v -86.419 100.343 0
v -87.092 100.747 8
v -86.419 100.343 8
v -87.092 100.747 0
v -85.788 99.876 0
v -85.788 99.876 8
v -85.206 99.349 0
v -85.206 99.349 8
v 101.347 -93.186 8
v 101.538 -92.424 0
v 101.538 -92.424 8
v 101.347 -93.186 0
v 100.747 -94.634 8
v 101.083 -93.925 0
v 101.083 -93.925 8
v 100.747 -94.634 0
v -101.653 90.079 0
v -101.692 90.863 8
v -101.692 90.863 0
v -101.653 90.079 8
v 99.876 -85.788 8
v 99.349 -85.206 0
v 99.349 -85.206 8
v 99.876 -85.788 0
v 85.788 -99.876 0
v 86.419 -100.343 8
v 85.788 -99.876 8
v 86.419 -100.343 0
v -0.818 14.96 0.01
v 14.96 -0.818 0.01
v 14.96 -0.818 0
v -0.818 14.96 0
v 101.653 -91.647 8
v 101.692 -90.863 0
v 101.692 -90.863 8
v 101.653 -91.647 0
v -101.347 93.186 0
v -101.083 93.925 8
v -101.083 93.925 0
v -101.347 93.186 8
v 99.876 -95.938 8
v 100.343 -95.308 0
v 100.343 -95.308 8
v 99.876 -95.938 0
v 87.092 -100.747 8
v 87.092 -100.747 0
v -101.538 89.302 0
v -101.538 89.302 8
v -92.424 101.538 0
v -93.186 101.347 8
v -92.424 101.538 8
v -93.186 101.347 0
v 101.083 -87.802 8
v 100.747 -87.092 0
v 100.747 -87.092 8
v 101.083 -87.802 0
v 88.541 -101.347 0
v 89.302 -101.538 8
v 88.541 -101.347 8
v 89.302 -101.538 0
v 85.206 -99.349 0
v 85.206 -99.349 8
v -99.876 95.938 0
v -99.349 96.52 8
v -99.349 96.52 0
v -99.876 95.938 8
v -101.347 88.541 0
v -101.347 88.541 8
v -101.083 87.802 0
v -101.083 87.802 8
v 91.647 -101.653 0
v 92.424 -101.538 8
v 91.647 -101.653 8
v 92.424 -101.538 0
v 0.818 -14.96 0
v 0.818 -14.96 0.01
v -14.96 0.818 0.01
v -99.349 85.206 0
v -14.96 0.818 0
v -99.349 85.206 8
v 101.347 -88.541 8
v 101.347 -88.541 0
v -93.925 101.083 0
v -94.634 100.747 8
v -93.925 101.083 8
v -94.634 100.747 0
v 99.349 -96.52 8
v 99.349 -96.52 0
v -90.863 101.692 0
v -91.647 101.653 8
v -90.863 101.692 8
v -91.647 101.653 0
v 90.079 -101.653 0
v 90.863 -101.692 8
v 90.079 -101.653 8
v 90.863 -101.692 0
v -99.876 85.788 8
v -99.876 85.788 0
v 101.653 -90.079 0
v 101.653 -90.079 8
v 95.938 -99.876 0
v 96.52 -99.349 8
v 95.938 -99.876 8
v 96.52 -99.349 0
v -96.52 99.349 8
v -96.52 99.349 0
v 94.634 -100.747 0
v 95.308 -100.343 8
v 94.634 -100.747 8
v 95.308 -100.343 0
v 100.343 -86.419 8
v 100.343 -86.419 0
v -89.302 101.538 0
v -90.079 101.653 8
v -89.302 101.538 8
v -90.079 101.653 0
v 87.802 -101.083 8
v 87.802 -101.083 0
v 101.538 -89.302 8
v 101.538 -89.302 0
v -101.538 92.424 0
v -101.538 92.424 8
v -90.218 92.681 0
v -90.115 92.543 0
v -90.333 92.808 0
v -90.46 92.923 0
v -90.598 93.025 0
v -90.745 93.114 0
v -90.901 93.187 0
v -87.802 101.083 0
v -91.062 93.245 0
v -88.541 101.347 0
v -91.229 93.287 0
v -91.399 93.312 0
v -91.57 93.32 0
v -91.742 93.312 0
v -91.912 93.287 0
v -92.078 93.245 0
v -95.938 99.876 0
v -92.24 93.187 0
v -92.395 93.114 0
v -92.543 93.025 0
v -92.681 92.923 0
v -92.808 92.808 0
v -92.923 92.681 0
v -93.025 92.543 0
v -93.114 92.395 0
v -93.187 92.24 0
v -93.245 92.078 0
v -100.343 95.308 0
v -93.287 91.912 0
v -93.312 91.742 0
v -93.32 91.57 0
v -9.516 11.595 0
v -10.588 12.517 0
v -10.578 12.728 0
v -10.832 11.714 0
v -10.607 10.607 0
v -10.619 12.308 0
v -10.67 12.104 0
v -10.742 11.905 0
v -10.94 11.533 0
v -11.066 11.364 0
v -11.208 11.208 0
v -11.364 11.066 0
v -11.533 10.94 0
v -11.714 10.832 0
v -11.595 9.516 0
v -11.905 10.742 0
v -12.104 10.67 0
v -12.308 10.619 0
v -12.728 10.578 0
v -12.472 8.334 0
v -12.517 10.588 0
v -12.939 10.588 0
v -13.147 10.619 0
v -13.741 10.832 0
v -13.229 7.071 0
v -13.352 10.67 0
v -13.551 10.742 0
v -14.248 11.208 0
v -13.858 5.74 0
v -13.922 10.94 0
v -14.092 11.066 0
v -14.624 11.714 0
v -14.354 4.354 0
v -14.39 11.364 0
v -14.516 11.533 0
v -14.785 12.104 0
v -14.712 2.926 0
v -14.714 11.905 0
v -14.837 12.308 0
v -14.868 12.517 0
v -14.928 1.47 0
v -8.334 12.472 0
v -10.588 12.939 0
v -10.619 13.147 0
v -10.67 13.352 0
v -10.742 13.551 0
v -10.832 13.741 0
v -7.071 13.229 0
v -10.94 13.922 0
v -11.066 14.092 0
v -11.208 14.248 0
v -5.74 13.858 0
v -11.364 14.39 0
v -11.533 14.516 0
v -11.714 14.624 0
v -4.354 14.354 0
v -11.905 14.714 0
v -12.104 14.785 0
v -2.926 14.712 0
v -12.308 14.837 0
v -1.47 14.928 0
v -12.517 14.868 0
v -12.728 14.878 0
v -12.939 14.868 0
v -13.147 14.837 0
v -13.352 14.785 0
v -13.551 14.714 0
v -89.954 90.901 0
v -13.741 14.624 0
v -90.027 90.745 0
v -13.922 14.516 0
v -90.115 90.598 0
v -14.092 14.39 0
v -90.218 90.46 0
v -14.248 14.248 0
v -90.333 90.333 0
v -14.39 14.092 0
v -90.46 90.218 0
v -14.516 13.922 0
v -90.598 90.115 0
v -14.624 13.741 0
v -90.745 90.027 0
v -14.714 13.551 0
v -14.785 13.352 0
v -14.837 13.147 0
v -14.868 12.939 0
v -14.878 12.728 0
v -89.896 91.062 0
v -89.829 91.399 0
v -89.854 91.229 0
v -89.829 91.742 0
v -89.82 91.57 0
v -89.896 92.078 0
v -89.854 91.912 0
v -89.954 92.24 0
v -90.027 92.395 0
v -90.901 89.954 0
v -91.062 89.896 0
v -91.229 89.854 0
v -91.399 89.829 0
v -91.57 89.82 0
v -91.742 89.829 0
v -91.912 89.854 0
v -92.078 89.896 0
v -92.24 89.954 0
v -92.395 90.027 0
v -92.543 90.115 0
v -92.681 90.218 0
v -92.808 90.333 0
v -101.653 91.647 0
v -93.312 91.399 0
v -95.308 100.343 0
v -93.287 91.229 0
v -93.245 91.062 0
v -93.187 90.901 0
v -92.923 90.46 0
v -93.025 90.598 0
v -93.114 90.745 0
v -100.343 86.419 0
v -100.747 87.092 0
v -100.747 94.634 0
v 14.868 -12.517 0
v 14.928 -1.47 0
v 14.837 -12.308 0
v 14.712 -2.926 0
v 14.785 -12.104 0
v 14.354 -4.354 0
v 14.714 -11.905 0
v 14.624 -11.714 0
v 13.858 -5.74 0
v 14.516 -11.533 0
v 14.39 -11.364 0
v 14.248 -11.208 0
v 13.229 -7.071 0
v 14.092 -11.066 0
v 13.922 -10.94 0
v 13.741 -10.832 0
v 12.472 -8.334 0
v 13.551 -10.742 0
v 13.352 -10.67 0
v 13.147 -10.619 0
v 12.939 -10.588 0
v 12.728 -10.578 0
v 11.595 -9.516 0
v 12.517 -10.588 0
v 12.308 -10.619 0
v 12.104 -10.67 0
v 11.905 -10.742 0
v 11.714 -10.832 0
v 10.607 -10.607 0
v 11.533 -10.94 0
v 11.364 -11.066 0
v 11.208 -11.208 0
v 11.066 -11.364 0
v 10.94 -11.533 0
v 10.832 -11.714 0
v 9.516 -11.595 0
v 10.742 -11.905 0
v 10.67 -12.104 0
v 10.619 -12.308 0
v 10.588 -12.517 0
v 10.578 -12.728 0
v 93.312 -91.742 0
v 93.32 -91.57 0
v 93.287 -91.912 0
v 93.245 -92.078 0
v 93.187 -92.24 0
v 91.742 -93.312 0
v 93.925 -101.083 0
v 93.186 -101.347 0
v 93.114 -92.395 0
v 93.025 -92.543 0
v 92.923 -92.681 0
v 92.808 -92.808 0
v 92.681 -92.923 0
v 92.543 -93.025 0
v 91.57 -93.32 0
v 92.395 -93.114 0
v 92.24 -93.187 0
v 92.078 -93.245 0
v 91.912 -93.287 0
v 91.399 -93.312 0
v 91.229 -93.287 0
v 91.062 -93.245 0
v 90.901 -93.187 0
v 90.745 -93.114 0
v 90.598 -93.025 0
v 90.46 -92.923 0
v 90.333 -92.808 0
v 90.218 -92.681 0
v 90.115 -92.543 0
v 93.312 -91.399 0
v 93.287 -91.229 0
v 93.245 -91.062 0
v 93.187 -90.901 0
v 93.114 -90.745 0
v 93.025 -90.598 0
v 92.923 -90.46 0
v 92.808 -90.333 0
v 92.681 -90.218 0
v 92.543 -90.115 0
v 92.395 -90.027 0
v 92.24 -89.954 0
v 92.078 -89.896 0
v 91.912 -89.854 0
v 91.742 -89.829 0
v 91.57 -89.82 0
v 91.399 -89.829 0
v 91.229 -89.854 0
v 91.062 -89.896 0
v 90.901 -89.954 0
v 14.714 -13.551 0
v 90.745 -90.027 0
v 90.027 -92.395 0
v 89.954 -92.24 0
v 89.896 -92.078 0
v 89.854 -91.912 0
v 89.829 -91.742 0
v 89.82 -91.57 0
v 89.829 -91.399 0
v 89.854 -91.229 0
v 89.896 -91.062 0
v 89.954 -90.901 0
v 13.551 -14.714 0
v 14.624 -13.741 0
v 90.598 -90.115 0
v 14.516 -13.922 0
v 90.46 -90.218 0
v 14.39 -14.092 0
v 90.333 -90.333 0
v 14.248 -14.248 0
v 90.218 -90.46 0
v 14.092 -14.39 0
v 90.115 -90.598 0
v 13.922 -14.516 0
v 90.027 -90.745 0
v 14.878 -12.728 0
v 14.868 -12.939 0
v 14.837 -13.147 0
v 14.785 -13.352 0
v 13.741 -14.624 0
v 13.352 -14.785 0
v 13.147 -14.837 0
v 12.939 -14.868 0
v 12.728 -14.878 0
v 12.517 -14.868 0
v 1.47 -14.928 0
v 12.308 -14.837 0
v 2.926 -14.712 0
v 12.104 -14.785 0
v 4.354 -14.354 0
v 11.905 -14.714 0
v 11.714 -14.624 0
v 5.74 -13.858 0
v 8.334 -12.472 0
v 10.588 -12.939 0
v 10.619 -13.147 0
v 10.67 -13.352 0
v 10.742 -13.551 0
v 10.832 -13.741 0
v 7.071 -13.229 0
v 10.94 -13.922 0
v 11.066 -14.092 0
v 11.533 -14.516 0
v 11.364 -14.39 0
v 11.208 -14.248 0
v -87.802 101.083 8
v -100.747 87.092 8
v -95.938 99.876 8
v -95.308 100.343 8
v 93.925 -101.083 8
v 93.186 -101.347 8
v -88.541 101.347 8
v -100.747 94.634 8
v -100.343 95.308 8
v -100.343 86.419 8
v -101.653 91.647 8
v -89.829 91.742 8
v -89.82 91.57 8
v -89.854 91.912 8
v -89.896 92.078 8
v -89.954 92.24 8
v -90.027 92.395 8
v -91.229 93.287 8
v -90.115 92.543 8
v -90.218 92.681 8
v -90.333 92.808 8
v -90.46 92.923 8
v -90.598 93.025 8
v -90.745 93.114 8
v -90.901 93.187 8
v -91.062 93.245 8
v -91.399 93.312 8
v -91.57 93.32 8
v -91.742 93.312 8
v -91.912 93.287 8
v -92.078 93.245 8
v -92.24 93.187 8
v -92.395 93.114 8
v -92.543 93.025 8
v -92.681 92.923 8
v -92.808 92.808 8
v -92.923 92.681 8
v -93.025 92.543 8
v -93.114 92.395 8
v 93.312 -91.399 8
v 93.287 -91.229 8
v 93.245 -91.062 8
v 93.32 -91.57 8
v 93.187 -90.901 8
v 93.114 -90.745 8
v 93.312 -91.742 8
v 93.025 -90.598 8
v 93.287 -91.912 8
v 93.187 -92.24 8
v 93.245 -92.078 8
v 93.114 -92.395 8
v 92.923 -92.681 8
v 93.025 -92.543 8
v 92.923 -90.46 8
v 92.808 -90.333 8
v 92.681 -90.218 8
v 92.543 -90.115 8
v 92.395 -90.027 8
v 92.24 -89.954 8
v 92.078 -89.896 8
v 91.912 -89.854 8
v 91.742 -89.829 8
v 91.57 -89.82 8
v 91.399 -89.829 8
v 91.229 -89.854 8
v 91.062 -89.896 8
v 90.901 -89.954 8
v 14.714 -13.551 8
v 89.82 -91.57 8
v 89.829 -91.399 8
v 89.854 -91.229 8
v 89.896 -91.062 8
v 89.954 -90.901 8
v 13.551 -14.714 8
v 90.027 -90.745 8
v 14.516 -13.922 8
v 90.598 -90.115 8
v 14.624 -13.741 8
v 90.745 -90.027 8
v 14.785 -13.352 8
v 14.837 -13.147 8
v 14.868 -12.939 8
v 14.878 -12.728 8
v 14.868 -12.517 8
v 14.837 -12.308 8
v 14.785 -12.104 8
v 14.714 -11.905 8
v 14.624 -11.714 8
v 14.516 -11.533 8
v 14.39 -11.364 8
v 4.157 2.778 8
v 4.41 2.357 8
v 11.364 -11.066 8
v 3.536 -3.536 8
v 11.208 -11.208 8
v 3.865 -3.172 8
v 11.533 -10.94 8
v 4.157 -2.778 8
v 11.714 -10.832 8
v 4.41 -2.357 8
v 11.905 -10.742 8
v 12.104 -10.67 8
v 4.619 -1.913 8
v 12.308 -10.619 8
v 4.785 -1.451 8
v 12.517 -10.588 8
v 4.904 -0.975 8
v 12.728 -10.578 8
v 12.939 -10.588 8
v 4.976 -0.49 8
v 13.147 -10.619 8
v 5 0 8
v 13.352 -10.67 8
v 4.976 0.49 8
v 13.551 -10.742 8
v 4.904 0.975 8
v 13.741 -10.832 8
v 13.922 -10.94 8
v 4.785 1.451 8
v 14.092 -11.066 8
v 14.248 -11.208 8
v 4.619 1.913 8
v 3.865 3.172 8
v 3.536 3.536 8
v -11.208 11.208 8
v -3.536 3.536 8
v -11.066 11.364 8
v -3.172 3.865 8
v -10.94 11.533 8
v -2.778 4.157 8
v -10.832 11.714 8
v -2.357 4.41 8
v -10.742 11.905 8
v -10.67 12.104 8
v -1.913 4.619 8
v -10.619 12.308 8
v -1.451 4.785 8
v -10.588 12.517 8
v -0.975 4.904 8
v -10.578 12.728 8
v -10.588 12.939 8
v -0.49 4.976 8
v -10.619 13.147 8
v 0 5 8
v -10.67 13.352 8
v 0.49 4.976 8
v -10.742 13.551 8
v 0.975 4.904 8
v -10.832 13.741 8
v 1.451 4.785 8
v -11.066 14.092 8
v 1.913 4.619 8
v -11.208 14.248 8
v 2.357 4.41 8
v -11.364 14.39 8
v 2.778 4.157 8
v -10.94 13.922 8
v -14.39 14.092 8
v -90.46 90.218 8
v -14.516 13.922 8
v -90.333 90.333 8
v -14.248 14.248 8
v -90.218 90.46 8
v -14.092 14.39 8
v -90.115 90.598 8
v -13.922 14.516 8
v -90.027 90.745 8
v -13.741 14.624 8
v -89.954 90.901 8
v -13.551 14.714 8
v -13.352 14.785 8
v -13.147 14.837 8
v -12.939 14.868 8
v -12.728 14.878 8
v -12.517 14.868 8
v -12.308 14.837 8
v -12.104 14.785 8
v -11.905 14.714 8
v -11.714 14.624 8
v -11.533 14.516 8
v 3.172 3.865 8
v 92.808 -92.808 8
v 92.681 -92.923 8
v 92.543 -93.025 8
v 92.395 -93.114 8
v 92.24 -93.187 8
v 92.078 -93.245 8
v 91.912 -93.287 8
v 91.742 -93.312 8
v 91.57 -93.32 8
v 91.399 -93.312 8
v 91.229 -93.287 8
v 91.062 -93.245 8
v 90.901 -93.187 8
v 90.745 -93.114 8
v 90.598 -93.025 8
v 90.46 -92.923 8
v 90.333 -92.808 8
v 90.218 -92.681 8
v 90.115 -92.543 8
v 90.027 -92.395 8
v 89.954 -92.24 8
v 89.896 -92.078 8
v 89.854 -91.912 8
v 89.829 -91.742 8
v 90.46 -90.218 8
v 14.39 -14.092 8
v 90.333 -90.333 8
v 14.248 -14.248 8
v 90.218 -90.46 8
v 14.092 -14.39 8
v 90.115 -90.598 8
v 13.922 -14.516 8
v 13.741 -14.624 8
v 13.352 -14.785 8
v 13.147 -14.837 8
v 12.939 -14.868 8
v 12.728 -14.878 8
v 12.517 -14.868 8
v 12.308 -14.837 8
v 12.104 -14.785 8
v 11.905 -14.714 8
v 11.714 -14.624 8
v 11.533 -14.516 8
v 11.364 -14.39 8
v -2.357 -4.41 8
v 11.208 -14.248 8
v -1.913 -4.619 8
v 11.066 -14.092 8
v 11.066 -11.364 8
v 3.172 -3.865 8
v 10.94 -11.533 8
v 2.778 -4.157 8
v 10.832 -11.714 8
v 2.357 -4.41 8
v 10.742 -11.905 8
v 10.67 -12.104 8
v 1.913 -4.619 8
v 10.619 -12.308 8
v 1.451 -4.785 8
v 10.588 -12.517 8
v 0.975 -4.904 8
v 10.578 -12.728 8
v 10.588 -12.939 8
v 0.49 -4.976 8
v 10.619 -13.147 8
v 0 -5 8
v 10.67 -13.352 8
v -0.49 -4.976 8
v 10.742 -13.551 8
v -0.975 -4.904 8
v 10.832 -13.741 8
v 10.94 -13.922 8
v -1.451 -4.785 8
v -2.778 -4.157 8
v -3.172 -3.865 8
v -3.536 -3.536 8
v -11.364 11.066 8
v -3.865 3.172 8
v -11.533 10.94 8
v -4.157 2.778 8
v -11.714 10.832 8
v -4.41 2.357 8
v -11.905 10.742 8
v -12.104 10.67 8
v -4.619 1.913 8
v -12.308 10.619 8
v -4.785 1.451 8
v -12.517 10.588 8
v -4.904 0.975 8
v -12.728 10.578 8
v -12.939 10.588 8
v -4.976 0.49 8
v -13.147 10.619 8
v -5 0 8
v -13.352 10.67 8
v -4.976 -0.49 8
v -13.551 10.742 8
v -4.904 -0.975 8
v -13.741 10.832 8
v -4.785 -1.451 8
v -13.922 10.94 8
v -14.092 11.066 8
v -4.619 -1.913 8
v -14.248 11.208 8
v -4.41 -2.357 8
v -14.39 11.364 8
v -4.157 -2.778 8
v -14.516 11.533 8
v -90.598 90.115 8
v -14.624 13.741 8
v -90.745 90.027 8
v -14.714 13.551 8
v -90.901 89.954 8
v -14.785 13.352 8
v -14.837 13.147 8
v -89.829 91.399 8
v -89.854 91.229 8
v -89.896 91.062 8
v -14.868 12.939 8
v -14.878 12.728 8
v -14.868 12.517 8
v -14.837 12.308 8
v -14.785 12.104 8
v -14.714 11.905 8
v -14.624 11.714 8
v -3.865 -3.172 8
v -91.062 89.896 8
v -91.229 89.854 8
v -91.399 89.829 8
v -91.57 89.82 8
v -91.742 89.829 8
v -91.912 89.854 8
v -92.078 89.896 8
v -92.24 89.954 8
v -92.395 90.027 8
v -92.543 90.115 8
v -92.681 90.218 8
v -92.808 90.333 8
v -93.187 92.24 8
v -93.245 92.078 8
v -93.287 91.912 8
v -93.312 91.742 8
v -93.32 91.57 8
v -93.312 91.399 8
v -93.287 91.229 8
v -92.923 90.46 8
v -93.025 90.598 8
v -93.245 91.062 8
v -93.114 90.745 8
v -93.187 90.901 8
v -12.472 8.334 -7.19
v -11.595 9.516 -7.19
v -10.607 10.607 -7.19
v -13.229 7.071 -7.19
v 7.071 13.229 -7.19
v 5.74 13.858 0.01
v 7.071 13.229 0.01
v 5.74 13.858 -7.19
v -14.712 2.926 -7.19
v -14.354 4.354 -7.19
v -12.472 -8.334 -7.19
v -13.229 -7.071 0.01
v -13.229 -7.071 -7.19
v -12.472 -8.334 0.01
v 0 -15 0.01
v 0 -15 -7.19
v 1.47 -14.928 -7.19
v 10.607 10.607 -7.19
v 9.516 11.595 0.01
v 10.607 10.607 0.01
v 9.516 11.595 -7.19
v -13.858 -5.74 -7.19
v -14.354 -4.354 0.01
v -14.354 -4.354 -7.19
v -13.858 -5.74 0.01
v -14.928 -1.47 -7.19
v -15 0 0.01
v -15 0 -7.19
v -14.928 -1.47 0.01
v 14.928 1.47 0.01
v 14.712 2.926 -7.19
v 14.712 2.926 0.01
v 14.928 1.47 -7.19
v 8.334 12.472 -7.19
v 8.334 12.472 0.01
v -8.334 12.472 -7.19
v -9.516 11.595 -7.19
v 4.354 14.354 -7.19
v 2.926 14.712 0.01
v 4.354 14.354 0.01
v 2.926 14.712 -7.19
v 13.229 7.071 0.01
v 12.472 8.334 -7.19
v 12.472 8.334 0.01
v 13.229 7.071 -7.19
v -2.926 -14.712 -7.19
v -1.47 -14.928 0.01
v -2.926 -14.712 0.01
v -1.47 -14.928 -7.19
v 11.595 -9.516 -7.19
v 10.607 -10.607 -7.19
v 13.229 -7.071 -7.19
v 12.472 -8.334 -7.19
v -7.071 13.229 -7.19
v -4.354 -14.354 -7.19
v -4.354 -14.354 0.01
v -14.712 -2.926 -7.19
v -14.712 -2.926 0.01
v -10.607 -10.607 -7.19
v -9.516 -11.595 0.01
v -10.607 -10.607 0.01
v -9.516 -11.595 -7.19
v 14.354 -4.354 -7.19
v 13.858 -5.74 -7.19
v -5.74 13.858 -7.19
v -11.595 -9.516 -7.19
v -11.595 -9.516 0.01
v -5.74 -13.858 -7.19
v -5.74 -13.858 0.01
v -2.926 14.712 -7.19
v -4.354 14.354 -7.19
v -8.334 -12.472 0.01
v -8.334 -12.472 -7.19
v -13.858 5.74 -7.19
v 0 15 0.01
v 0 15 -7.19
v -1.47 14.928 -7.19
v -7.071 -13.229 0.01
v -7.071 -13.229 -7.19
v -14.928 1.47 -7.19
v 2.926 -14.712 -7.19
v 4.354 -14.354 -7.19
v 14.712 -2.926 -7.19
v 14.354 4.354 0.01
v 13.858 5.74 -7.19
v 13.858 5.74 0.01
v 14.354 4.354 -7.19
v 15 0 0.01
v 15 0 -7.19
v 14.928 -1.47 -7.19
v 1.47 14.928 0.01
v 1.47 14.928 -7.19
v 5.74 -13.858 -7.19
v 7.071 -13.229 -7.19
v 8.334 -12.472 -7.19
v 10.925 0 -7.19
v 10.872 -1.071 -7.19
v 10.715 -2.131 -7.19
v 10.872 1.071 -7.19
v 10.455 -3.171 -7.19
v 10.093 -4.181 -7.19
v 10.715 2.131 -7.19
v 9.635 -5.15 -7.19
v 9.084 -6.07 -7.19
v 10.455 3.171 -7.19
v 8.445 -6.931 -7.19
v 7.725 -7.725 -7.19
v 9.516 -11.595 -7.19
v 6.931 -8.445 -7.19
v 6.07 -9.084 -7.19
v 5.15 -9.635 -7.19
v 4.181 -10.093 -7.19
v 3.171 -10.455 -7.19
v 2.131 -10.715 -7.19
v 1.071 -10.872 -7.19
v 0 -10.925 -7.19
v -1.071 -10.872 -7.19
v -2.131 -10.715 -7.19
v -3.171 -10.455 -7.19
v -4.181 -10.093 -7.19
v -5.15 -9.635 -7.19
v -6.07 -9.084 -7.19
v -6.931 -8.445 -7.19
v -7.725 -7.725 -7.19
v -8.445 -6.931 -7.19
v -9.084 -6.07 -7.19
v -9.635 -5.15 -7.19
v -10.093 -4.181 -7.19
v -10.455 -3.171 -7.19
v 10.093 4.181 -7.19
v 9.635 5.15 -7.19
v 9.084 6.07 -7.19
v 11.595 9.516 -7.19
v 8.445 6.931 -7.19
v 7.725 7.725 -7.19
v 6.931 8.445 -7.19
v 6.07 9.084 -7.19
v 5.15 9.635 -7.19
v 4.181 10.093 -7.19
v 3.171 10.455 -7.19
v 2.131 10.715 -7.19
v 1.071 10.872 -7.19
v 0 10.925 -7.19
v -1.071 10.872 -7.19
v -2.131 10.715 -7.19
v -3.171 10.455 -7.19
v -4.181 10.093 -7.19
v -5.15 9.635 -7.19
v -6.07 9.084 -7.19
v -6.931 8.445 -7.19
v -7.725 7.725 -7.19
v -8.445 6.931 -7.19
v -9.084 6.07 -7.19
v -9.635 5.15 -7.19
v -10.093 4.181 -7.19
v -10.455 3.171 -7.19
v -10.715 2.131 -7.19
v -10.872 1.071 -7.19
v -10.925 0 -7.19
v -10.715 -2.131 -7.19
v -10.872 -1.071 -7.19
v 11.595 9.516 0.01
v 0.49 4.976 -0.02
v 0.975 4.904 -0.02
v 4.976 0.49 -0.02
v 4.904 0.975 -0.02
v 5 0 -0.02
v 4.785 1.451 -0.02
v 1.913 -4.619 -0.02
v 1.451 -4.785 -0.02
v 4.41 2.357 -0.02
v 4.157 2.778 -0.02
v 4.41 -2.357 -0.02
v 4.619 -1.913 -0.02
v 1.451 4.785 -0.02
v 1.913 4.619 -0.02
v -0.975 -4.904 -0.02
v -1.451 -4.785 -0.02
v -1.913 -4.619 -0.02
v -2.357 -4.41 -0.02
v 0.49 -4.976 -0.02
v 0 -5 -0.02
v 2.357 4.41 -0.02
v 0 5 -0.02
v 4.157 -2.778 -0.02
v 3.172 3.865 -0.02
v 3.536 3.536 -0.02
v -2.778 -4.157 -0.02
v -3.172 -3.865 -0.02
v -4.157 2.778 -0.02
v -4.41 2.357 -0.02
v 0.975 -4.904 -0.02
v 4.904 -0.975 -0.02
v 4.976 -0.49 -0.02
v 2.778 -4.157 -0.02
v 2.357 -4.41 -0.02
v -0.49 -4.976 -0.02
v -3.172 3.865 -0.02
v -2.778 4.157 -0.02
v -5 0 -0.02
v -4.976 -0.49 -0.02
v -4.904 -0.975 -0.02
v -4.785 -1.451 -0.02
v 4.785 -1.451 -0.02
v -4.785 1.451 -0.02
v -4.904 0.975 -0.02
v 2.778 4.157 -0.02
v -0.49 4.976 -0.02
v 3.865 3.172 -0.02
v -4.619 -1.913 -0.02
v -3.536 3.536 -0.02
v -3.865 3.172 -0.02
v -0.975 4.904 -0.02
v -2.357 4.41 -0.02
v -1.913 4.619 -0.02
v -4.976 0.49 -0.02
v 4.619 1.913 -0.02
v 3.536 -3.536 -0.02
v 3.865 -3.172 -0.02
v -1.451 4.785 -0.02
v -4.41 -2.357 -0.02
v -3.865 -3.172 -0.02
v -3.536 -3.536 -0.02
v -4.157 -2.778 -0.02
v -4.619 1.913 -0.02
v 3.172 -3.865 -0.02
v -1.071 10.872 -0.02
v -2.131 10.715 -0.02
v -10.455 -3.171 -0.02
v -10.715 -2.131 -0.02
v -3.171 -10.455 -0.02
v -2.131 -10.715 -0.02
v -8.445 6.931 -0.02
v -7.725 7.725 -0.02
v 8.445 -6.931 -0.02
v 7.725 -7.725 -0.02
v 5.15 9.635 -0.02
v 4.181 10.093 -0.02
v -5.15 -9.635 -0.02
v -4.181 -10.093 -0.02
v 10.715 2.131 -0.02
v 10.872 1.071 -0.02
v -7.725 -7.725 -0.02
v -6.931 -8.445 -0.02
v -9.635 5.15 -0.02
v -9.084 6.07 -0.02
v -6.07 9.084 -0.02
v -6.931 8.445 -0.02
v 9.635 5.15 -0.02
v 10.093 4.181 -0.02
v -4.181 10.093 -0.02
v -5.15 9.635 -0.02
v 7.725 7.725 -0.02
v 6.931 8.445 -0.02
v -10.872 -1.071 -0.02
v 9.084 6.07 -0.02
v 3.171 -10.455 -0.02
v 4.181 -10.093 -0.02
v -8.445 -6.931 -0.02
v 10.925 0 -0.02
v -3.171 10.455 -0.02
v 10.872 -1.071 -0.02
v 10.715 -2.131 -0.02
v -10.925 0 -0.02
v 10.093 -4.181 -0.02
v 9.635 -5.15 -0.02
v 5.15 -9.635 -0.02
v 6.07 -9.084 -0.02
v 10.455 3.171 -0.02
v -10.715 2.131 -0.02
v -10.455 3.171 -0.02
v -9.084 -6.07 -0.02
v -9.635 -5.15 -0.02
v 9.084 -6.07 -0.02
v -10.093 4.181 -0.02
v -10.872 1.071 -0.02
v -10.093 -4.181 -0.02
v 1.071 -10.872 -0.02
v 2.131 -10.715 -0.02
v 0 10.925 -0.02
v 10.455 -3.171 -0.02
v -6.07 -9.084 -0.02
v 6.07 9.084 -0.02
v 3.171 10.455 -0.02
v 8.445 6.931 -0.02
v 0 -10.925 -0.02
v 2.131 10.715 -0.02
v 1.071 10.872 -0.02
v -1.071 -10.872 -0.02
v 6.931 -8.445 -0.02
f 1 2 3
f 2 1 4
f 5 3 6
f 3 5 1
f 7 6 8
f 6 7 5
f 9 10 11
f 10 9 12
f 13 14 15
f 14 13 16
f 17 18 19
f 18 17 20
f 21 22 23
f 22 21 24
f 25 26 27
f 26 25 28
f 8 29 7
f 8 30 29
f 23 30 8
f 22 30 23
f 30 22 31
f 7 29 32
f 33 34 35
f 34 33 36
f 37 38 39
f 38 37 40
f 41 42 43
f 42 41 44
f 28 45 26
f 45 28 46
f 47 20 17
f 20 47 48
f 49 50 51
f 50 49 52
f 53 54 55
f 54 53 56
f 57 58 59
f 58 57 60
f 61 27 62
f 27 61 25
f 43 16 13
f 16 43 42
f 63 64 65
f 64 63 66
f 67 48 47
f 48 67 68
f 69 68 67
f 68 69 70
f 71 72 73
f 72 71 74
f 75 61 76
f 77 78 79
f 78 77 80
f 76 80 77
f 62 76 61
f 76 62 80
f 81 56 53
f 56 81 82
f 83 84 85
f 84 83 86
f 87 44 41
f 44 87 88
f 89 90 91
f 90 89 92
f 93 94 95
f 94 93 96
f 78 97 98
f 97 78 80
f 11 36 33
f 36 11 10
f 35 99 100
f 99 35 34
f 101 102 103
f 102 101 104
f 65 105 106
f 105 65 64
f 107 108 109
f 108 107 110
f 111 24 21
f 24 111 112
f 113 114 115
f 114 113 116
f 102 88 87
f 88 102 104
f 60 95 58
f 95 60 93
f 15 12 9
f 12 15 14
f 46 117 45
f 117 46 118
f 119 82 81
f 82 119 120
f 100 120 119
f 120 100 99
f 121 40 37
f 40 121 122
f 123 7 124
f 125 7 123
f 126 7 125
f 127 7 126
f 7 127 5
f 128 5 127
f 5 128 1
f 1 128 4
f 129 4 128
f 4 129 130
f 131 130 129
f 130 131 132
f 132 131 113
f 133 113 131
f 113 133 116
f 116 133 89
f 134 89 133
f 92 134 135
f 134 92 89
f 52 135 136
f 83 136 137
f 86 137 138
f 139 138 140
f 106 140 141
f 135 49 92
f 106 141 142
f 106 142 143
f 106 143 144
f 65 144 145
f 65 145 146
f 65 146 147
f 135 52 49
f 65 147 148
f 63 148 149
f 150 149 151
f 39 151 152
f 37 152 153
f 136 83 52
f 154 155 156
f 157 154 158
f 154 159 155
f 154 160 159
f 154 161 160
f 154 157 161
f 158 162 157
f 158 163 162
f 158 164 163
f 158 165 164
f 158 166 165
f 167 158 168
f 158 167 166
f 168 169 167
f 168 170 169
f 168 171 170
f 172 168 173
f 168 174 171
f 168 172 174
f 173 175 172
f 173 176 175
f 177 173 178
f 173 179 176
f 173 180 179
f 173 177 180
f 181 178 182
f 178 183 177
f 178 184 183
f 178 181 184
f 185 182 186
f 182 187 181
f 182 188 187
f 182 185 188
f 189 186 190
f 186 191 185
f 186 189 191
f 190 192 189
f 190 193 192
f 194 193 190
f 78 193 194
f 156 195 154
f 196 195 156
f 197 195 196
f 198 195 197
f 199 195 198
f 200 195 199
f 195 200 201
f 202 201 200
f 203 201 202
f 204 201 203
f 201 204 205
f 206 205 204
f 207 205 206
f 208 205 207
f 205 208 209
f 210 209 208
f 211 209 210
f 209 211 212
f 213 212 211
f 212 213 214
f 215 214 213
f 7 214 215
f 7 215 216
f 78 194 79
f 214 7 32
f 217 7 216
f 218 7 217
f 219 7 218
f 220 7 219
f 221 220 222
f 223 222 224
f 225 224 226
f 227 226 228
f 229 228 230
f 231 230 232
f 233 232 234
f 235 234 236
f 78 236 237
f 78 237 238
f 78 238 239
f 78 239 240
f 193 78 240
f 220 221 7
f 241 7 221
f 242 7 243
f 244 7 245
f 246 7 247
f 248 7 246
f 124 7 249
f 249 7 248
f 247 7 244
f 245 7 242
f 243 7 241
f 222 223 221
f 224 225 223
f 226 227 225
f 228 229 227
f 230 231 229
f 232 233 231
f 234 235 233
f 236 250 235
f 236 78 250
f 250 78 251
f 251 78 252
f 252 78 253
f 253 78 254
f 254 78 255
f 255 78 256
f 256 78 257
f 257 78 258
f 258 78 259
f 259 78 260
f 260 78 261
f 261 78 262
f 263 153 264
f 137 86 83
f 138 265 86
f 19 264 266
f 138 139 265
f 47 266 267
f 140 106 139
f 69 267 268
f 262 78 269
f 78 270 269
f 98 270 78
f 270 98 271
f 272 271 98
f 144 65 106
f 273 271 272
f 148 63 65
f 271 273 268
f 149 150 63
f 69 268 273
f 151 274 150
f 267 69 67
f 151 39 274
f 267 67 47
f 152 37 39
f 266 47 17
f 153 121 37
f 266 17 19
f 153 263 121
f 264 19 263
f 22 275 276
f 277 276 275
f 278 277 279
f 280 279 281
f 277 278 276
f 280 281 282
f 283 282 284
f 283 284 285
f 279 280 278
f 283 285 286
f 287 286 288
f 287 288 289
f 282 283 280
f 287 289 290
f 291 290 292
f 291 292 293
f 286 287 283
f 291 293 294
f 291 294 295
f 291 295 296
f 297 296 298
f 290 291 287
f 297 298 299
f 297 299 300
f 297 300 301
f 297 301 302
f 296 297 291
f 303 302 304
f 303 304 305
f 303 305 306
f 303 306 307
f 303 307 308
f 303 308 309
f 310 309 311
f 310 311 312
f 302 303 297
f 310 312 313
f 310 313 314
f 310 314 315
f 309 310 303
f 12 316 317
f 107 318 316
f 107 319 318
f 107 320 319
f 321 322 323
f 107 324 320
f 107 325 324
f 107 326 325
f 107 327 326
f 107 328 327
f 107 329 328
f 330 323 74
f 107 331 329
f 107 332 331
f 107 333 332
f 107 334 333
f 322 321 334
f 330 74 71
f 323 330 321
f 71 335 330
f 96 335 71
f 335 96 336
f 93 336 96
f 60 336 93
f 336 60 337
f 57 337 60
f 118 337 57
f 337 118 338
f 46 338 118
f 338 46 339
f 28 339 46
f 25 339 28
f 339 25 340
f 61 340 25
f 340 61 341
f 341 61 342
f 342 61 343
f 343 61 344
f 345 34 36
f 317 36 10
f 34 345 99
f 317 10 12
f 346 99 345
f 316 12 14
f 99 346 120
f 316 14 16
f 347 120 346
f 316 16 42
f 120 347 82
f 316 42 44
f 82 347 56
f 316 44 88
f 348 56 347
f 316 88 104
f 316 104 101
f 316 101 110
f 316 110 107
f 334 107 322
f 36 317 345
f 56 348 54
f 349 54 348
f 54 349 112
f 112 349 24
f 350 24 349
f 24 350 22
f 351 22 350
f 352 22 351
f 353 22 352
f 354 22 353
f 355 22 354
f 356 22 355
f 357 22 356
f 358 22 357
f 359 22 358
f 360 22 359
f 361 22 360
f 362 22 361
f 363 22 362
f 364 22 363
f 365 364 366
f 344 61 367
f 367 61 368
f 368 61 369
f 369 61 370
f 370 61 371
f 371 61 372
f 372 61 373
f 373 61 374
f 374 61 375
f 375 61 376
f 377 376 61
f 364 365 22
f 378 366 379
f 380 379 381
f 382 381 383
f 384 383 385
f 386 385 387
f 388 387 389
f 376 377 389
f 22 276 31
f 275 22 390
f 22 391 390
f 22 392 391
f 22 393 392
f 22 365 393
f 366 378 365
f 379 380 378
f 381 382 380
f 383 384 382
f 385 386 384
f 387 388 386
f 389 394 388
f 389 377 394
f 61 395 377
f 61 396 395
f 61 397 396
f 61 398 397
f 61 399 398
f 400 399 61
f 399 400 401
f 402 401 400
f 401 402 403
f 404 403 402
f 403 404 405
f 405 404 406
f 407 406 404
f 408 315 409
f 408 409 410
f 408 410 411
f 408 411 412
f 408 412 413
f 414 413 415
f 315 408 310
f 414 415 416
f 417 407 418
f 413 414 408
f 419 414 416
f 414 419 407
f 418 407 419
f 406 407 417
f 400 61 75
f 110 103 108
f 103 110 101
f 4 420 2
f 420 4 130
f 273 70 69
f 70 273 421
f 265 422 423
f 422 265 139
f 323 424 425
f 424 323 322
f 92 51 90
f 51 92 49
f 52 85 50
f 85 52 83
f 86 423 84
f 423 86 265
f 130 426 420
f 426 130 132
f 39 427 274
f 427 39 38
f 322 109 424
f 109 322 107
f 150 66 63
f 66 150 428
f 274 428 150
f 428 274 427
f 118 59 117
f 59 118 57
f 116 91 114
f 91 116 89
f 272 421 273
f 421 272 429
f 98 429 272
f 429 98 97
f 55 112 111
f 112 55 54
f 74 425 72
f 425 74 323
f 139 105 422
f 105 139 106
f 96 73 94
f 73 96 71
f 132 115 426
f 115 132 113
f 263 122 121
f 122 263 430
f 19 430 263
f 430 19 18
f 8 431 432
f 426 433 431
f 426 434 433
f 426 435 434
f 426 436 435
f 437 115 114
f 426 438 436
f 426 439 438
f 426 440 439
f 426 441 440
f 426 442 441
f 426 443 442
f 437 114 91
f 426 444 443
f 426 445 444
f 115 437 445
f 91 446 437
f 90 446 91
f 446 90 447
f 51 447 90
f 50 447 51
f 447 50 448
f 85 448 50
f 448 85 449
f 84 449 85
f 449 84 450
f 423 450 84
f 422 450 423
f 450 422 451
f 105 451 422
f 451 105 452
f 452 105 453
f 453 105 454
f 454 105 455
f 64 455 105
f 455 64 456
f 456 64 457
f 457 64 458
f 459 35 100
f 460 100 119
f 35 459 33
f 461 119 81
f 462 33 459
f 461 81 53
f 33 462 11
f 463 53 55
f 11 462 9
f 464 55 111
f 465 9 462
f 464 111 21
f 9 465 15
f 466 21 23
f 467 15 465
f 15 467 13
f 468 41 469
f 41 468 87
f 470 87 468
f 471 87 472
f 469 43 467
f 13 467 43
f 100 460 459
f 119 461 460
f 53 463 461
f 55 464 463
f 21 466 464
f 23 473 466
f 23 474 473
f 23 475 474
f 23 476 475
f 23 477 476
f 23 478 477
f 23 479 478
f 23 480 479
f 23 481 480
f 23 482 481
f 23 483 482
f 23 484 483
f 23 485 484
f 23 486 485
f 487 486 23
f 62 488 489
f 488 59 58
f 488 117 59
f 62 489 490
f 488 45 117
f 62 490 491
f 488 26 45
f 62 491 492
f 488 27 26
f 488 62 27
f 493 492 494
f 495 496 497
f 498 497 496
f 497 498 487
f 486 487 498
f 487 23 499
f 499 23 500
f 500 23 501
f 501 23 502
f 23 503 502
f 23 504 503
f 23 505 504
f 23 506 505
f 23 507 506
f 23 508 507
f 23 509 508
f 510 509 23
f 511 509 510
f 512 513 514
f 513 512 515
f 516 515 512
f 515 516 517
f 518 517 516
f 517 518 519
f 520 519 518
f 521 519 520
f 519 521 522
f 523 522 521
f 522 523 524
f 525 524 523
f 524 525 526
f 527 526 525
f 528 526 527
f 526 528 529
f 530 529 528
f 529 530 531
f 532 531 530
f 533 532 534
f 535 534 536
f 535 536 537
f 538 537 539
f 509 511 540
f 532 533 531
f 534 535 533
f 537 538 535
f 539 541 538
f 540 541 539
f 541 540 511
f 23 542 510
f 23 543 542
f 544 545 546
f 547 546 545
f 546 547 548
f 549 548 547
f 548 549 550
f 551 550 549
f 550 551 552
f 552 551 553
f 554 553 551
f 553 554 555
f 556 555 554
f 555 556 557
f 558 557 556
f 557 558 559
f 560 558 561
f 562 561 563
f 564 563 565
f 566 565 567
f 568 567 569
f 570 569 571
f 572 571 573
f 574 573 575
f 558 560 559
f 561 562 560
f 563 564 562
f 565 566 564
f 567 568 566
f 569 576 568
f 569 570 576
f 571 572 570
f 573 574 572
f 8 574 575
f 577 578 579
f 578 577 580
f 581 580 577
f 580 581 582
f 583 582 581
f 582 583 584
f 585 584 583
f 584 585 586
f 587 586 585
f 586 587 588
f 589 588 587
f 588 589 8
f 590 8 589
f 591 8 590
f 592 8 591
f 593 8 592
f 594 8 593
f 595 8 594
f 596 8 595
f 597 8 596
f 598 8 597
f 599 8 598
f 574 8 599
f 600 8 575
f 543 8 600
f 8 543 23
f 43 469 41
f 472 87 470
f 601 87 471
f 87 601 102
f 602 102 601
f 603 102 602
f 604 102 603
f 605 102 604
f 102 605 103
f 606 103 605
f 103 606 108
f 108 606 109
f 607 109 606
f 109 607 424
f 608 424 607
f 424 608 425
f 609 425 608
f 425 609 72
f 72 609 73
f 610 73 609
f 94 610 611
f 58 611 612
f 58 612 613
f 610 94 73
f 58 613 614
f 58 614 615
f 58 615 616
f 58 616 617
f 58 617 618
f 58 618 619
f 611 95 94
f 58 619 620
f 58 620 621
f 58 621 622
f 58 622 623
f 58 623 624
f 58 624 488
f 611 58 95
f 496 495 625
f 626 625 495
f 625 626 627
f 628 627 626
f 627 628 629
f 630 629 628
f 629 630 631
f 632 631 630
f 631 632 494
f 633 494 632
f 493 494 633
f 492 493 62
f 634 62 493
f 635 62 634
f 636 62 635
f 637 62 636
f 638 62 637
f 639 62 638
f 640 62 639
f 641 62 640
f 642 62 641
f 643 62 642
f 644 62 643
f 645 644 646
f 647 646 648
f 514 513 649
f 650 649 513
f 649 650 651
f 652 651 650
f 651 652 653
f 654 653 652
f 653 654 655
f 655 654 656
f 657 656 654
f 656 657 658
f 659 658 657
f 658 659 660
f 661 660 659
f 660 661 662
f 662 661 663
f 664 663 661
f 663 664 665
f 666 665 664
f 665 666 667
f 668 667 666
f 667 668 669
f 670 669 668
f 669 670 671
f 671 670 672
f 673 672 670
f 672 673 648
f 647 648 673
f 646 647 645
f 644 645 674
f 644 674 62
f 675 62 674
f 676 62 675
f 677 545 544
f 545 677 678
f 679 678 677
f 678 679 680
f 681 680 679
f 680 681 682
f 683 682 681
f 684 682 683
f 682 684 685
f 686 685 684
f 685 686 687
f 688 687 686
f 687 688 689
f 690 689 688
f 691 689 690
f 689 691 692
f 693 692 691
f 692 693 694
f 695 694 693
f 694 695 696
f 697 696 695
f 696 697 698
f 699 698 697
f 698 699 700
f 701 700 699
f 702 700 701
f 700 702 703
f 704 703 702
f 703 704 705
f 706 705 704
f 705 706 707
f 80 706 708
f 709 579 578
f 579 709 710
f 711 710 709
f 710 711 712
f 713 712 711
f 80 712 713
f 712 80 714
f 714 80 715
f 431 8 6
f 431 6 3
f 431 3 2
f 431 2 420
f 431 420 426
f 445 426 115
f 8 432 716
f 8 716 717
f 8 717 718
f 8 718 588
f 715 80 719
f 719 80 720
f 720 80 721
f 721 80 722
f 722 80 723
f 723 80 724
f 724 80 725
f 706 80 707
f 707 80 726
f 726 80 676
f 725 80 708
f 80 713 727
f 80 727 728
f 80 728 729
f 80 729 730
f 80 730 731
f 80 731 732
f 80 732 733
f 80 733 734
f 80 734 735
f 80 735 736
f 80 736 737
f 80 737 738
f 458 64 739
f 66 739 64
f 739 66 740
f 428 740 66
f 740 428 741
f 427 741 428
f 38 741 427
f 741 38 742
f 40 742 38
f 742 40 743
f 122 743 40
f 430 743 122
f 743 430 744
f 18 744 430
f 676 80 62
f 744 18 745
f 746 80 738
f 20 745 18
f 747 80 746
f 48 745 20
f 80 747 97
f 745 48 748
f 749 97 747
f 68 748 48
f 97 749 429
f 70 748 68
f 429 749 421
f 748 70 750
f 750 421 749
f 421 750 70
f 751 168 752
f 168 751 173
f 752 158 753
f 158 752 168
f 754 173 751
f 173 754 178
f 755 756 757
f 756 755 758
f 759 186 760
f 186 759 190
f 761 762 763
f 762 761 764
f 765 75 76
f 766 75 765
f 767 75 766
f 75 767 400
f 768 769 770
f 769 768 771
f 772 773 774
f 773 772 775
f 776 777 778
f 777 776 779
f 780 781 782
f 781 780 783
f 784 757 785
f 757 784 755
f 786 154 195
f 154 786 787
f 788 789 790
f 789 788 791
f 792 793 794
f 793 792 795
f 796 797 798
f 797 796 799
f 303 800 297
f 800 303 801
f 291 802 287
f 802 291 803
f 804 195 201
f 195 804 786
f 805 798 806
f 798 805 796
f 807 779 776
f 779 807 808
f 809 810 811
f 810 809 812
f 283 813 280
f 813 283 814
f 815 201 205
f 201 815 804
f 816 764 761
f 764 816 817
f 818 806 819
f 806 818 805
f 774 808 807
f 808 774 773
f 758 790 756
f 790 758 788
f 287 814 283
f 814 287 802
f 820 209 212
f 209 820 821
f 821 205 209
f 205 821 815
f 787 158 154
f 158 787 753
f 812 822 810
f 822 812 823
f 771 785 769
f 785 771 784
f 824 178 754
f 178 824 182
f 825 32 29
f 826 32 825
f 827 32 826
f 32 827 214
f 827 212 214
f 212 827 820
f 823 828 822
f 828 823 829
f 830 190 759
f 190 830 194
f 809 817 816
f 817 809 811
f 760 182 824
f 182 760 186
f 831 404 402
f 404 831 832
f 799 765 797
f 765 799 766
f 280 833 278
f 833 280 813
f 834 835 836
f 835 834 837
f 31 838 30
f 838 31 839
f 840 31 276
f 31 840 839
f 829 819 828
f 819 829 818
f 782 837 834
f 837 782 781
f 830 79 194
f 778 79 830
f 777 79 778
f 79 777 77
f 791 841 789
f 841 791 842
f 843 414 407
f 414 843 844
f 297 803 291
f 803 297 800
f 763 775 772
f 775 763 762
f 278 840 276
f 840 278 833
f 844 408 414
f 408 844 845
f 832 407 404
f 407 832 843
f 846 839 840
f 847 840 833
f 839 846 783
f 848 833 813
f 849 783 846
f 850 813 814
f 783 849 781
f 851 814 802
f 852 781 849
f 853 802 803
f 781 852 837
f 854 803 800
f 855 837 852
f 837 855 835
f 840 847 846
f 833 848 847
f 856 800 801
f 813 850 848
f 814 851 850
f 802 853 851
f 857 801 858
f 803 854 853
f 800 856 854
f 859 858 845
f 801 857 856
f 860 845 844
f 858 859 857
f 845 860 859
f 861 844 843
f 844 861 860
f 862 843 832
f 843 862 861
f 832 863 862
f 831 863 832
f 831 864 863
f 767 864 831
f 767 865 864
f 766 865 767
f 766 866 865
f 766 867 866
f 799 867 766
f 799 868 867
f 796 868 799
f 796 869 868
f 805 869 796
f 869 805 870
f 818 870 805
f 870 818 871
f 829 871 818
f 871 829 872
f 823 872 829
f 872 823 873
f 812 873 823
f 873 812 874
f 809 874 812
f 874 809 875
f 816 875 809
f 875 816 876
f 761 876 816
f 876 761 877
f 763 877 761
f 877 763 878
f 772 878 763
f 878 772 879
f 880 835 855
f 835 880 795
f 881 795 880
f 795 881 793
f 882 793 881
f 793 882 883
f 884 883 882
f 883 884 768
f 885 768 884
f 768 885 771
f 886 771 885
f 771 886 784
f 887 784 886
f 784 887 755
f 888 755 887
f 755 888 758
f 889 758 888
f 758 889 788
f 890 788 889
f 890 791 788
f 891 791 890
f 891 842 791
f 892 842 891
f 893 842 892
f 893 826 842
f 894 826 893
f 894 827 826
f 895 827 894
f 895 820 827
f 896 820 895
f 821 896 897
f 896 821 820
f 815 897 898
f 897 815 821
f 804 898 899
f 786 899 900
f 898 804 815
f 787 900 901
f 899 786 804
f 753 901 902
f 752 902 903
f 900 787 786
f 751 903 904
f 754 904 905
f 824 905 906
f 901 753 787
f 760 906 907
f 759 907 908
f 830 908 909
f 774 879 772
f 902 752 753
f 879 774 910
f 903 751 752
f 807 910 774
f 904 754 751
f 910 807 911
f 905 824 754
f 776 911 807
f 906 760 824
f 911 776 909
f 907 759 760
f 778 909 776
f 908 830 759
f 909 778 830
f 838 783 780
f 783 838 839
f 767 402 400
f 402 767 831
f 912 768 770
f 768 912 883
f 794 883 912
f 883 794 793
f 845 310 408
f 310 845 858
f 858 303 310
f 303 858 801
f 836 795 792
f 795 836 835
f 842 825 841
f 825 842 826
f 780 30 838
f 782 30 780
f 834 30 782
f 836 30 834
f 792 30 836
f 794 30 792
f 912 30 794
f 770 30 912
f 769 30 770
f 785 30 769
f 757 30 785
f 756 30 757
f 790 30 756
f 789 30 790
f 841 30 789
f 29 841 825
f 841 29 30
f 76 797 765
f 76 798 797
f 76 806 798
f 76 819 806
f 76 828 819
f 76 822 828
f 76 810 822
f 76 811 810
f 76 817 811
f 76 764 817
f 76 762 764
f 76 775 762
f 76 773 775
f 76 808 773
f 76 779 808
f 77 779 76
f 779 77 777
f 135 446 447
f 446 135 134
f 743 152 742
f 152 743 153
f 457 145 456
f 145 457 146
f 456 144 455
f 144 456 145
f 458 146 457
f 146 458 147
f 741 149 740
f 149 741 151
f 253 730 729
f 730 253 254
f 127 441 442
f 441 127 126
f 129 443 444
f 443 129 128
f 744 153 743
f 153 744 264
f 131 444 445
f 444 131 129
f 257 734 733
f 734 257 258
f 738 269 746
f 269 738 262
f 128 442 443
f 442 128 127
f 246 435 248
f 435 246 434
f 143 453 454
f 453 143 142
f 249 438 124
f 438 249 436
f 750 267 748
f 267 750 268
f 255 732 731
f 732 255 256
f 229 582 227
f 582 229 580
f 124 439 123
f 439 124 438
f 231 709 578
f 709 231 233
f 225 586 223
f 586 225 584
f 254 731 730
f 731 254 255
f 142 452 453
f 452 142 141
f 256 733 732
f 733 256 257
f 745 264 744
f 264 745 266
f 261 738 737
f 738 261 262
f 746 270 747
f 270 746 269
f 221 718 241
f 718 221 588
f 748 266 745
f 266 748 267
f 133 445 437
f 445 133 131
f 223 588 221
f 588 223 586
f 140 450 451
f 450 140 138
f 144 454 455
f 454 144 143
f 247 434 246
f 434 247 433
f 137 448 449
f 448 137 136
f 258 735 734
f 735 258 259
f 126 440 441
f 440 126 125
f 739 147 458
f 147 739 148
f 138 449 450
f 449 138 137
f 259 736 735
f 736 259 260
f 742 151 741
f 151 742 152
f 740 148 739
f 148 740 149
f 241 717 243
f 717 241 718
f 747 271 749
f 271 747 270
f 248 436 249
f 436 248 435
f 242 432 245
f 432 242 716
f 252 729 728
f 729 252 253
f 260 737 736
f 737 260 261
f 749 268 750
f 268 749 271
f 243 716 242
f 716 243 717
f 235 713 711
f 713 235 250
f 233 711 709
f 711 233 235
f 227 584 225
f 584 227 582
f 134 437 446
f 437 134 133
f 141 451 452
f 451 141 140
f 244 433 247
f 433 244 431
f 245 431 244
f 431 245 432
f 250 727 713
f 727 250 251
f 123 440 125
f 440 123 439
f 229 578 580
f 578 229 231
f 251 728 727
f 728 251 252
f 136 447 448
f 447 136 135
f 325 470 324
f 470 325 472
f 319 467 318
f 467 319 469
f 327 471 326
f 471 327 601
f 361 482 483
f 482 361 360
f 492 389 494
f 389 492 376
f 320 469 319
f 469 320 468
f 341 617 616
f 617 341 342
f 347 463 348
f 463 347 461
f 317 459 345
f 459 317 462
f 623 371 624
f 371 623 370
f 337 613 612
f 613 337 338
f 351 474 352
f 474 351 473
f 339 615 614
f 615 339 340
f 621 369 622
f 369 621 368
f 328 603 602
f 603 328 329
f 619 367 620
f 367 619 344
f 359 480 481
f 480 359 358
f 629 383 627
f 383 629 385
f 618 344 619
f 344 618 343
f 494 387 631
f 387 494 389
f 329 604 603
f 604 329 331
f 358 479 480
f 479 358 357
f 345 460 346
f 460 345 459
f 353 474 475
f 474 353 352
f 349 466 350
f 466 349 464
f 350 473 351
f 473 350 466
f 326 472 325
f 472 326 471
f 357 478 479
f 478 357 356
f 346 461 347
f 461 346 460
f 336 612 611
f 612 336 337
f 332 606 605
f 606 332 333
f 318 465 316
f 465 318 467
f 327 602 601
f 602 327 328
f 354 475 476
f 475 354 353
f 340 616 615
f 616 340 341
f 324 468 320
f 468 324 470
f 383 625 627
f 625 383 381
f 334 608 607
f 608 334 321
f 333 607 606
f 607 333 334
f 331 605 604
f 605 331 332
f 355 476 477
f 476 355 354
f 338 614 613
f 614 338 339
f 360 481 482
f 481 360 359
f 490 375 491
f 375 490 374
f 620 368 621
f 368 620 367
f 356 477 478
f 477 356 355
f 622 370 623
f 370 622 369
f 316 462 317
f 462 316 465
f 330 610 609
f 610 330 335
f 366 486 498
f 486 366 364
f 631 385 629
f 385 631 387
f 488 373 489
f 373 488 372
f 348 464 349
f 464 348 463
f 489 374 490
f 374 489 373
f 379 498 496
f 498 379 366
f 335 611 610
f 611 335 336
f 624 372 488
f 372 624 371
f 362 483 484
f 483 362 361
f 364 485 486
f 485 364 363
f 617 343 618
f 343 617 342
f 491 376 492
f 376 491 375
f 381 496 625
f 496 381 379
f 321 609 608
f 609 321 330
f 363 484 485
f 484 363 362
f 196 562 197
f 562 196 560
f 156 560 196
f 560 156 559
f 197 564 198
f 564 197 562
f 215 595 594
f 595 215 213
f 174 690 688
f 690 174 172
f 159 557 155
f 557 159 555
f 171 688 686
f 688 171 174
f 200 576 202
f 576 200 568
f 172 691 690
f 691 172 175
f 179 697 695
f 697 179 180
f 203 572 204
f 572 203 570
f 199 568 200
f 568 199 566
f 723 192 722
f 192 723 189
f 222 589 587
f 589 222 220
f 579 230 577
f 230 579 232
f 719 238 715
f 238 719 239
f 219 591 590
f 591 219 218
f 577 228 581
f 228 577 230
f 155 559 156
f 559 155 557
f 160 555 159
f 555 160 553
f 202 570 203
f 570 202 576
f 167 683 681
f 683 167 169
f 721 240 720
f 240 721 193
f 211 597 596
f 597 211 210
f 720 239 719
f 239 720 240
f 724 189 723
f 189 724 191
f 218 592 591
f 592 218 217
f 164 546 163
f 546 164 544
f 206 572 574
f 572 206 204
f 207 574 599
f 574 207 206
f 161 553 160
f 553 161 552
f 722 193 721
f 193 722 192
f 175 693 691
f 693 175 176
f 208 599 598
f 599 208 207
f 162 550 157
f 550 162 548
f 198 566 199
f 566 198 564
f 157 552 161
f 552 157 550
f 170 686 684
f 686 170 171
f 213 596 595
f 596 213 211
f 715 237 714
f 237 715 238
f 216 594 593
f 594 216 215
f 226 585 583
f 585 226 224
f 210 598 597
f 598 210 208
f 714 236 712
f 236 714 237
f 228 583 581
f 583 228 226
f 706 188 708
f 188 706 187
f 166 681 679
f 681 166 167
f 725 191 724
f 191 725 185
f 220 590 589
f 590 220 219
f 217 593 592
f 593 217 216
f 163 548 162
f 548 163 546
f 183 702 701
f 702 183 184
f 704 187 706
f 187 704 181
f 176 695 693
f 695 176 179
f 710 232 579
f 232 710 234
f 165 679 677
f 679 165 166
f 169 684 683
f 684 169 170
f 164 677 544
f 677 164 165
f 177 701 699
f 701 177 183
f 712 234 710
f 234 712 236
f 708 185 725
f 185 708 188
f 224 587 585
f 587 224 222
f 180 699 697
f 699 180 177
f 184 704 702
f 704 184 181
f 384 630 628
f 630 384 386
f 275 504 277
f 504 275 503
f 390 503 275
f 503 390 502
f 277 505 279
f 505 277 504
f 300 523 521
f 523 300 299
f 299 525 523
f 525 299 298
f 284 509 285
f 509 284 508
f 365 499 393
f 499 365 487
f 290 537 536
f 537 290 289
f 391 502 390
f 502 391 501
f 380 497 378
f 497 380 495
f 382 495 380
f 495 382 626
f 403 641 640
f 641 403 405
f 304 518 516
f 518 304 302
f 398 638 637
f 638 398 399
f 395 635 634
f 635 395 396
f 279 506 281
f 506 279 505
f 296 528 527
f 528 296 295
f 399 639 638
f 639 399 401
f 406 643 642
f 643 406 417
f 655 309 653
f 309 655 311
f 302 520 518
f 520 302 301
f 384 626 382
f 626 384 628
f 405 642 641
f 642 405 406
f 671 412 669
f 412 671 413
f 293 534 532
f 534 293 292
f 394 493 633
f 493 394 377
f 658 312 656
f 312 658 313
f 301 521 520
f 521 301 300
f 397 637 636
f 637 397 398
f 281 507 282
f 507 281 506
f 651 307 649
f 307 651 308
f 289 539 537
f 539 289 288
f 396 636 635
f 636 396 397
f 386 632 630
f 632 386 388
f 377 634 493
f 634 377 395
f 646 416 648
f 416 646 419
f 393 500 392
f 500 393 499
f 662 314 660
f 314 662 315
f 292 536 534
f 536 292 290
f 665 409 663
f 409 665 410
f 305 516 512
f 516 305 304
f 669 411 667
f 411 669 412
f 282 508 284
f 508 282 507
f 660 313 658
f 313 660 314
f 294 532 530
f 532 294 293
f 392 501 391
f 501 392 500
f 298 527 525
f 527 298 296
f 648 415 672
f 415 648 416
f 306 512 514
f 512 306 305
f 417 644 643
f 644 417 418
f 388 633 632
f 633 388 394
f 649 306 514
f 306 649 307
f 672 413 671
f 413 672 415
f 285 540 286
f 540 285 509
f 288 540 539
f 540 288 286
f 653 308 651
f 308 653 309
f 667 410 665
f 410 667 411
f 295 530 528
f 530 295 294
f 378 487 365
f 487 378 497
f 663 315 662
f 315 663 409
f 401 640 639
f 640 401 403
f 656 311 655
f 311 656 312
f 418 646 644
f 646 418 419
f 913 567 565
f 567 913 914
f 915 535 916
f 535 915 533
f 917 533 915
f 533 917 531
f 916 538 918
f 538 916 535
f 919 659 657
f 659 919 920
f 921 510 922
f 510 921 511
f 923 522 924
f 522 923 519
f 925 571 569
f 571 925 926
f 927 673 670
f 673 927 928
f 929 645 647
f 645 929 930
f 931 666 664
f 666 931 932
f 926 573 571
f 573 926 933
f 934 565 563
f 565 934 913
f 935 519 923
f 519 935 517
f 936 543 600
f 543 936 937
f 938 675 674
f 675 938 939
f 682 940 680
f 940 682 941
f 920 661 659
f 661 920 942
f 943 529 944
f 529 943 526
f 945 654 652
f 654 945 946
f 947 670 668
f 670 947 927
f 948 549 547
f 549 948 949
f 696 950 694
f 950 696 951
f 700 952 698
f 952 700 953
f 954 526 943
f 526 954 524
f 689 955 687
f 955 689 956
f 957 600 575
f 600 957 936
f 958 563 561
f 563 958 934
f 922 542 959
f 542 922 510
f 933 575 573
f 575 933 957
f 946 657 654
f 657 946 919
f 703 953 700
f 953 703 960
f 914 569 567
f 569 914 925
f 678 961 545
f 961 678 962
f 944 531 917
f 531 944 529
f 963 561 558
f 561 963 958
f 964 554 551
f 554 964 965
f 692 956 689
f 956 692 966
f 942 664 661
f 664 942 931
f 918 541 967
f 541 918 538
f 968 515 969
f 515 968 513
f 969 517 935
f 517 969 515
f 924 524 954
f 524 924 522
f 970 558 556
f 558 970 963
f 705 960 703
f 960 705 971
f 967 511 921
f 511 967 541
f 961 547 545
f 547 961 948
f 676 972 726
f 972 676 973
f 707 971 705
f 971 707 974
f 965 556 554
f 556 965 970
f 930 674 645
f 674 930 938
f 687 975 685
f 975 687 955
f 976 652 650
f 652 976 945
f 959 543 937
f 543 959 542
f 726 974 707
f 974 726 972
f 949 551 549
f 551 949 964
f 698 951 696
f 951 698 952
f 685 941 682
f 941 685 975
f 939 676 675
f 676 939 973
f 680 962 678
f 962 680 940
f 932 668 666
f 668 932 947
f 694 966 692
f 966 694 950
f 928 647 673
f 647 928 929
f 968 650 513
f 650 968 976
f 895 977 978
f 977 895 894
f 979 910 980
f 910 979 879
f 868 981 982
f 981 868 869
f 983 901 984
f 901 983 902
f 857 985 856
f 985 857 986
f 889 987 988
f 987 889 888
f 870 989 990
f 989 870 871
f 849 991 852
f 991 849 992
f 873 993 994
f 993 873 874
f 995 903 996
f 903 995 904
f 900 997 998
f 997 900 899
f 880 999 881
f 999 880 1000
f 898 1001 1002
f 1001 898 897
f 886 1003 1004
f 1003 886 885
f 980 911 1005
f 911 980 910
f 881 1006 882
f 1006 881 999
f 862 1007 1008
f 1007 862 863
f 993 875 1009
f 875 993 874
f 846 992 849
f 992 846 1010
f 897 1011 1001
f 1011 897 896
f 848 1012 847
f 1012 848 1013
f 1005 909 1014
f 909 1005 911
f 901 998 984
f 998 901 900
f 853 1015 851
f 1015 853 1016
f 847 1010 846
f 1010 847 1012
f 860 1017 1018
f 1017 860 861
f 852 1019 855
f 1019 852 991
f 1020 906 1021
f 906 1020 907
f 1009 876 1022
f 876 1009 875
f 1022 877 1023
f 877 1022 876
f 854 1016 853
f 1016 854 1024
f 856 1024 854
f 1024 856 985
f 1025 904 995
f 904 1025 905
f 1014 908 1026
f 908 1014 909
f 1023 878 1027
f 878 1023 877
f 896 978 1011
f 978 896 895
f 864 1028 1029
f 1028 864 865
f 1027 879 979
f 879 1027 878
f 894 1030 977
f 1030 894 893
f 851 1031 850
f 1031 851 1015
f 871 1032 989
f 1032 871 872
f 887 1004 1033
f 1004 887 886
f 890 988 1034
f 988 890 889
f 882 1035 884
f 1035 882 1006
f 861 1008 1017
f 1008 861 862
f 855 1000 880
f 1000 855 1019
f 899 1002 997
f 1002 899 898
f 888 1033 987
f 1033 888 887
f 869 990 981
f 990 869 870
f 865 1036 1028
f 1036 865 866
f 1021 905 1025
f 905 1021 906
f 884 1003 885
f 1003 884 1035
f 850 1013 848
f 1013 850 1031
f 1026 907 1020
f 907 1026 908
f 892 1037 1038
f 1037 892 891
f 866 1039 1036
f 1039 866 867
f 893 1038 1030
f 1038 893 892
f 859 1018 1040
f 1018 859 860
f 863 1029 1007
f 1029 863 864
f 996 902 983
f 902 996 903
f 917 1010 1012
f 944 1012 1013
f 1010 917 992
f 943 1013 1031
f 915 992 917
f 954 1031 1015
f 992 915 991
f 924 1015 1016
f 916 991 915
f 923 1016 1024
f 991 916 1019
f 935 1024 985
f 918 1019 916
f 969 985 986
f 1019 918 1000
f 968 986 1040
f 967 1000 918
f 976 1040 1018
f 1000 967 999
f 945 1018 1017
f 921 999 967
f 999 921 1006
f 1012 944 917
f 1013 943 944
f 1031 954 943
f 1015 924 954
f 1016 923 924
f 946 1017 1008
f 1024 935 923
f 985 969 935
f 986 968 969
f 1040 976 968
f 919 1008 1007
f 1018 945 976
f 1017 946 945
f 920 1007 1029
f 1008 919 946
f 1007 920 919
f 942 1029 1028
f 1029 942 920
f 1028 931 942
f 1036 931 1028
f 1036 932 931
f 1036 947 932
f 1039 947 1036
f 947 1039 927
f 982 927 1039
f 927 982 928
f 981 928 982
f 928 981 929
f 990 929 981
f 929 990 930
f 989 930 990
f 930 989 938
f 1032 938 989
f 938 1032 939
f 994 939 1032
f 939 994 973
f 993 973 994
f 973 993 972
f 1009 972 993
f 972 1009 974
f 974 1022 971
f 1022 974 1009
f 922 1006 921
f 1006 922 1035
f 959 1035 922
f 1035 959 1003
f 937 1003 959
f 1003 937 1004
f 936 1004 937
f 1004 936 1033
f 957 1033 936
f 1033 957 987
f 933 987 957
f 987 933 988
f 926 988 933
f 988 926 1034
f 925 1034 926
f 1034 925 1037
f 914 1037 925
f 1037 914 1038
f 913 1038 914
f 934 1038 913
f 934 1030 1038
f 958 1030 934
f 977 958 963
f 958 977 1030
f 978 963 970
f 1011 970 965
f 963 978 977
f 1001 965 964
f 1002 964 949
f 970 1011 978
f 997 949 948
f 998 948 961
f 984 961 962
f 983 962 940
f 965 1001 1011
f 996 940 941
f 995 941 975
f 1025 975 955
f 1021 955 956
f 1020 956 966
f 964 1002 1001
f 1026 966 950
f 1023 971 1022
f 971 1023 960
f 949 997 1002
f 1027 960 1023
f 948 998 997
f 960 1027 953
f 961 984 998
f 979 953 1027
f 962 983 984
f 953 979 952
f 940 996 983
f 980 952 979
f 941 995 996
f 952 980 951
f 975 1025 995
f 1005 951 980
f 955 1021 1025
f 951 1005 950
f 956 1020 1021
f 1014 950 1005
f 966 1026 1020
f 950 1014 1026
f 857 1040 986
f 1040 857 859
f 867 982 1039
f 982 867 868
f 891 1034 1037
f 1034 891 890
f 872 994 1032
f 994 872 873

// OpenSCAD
// Gen-DD — rear BEARING BRIDGE (bar endbell, 2026-10-10): a 608 boss on a 20 mm wide bar that spans the
// two frame rods at 135 deg and 135+180 deg (R = flange_bolt_r). The front bridge uses the rods at 45/225 deg, the rear
// bridge the rods at 135/315 deg, so the two bridges cross at 90 deg and the stator is held at 4 points.
// A bar instead of a full disc is what lets this big-ring kit fit ONE 410 mm plate. Print flat face DOWN (boss up, no supports).
// Brace holes (temporary M4 jack rods, R = brace_r) sit on the bar axis.
include <parameters.scad>;
$fn = 64;
bar_w = 20;
bar_len = 2 * (flange_bolt_r + 9);
module bar_2d() { offset(r=8) offset(delta=-8) square([bar_len, bar_w], center=true); }
difference() {
    rotate([0, 0, 135]) union() {
        linear_extrude(endbell_thick) bar_2d();
        translate([0, 0, -bearing_h + 0.01]) cylinder(d=30, h=bearing_h);
    }
    translate([0, 0, -bearing_h - 0.1]) cylinder(d=endbell_shaft_clear, h=50);
    translate([0, 0, -bearing_h - 0.02]) cylinder(d=bearing_d, h=bearing_h);
    for (s = [0, 180]) rotate([0, 0, 135 + s]) translate([flange_bolt_r, 0, -20]) cylinder(d=m3_clear, h=60);
    for (a = brace_angles) translate([brace_r*cos(a), brace_r*sin(a), -20]) cylinder(d=brace_d, h=50);
}
